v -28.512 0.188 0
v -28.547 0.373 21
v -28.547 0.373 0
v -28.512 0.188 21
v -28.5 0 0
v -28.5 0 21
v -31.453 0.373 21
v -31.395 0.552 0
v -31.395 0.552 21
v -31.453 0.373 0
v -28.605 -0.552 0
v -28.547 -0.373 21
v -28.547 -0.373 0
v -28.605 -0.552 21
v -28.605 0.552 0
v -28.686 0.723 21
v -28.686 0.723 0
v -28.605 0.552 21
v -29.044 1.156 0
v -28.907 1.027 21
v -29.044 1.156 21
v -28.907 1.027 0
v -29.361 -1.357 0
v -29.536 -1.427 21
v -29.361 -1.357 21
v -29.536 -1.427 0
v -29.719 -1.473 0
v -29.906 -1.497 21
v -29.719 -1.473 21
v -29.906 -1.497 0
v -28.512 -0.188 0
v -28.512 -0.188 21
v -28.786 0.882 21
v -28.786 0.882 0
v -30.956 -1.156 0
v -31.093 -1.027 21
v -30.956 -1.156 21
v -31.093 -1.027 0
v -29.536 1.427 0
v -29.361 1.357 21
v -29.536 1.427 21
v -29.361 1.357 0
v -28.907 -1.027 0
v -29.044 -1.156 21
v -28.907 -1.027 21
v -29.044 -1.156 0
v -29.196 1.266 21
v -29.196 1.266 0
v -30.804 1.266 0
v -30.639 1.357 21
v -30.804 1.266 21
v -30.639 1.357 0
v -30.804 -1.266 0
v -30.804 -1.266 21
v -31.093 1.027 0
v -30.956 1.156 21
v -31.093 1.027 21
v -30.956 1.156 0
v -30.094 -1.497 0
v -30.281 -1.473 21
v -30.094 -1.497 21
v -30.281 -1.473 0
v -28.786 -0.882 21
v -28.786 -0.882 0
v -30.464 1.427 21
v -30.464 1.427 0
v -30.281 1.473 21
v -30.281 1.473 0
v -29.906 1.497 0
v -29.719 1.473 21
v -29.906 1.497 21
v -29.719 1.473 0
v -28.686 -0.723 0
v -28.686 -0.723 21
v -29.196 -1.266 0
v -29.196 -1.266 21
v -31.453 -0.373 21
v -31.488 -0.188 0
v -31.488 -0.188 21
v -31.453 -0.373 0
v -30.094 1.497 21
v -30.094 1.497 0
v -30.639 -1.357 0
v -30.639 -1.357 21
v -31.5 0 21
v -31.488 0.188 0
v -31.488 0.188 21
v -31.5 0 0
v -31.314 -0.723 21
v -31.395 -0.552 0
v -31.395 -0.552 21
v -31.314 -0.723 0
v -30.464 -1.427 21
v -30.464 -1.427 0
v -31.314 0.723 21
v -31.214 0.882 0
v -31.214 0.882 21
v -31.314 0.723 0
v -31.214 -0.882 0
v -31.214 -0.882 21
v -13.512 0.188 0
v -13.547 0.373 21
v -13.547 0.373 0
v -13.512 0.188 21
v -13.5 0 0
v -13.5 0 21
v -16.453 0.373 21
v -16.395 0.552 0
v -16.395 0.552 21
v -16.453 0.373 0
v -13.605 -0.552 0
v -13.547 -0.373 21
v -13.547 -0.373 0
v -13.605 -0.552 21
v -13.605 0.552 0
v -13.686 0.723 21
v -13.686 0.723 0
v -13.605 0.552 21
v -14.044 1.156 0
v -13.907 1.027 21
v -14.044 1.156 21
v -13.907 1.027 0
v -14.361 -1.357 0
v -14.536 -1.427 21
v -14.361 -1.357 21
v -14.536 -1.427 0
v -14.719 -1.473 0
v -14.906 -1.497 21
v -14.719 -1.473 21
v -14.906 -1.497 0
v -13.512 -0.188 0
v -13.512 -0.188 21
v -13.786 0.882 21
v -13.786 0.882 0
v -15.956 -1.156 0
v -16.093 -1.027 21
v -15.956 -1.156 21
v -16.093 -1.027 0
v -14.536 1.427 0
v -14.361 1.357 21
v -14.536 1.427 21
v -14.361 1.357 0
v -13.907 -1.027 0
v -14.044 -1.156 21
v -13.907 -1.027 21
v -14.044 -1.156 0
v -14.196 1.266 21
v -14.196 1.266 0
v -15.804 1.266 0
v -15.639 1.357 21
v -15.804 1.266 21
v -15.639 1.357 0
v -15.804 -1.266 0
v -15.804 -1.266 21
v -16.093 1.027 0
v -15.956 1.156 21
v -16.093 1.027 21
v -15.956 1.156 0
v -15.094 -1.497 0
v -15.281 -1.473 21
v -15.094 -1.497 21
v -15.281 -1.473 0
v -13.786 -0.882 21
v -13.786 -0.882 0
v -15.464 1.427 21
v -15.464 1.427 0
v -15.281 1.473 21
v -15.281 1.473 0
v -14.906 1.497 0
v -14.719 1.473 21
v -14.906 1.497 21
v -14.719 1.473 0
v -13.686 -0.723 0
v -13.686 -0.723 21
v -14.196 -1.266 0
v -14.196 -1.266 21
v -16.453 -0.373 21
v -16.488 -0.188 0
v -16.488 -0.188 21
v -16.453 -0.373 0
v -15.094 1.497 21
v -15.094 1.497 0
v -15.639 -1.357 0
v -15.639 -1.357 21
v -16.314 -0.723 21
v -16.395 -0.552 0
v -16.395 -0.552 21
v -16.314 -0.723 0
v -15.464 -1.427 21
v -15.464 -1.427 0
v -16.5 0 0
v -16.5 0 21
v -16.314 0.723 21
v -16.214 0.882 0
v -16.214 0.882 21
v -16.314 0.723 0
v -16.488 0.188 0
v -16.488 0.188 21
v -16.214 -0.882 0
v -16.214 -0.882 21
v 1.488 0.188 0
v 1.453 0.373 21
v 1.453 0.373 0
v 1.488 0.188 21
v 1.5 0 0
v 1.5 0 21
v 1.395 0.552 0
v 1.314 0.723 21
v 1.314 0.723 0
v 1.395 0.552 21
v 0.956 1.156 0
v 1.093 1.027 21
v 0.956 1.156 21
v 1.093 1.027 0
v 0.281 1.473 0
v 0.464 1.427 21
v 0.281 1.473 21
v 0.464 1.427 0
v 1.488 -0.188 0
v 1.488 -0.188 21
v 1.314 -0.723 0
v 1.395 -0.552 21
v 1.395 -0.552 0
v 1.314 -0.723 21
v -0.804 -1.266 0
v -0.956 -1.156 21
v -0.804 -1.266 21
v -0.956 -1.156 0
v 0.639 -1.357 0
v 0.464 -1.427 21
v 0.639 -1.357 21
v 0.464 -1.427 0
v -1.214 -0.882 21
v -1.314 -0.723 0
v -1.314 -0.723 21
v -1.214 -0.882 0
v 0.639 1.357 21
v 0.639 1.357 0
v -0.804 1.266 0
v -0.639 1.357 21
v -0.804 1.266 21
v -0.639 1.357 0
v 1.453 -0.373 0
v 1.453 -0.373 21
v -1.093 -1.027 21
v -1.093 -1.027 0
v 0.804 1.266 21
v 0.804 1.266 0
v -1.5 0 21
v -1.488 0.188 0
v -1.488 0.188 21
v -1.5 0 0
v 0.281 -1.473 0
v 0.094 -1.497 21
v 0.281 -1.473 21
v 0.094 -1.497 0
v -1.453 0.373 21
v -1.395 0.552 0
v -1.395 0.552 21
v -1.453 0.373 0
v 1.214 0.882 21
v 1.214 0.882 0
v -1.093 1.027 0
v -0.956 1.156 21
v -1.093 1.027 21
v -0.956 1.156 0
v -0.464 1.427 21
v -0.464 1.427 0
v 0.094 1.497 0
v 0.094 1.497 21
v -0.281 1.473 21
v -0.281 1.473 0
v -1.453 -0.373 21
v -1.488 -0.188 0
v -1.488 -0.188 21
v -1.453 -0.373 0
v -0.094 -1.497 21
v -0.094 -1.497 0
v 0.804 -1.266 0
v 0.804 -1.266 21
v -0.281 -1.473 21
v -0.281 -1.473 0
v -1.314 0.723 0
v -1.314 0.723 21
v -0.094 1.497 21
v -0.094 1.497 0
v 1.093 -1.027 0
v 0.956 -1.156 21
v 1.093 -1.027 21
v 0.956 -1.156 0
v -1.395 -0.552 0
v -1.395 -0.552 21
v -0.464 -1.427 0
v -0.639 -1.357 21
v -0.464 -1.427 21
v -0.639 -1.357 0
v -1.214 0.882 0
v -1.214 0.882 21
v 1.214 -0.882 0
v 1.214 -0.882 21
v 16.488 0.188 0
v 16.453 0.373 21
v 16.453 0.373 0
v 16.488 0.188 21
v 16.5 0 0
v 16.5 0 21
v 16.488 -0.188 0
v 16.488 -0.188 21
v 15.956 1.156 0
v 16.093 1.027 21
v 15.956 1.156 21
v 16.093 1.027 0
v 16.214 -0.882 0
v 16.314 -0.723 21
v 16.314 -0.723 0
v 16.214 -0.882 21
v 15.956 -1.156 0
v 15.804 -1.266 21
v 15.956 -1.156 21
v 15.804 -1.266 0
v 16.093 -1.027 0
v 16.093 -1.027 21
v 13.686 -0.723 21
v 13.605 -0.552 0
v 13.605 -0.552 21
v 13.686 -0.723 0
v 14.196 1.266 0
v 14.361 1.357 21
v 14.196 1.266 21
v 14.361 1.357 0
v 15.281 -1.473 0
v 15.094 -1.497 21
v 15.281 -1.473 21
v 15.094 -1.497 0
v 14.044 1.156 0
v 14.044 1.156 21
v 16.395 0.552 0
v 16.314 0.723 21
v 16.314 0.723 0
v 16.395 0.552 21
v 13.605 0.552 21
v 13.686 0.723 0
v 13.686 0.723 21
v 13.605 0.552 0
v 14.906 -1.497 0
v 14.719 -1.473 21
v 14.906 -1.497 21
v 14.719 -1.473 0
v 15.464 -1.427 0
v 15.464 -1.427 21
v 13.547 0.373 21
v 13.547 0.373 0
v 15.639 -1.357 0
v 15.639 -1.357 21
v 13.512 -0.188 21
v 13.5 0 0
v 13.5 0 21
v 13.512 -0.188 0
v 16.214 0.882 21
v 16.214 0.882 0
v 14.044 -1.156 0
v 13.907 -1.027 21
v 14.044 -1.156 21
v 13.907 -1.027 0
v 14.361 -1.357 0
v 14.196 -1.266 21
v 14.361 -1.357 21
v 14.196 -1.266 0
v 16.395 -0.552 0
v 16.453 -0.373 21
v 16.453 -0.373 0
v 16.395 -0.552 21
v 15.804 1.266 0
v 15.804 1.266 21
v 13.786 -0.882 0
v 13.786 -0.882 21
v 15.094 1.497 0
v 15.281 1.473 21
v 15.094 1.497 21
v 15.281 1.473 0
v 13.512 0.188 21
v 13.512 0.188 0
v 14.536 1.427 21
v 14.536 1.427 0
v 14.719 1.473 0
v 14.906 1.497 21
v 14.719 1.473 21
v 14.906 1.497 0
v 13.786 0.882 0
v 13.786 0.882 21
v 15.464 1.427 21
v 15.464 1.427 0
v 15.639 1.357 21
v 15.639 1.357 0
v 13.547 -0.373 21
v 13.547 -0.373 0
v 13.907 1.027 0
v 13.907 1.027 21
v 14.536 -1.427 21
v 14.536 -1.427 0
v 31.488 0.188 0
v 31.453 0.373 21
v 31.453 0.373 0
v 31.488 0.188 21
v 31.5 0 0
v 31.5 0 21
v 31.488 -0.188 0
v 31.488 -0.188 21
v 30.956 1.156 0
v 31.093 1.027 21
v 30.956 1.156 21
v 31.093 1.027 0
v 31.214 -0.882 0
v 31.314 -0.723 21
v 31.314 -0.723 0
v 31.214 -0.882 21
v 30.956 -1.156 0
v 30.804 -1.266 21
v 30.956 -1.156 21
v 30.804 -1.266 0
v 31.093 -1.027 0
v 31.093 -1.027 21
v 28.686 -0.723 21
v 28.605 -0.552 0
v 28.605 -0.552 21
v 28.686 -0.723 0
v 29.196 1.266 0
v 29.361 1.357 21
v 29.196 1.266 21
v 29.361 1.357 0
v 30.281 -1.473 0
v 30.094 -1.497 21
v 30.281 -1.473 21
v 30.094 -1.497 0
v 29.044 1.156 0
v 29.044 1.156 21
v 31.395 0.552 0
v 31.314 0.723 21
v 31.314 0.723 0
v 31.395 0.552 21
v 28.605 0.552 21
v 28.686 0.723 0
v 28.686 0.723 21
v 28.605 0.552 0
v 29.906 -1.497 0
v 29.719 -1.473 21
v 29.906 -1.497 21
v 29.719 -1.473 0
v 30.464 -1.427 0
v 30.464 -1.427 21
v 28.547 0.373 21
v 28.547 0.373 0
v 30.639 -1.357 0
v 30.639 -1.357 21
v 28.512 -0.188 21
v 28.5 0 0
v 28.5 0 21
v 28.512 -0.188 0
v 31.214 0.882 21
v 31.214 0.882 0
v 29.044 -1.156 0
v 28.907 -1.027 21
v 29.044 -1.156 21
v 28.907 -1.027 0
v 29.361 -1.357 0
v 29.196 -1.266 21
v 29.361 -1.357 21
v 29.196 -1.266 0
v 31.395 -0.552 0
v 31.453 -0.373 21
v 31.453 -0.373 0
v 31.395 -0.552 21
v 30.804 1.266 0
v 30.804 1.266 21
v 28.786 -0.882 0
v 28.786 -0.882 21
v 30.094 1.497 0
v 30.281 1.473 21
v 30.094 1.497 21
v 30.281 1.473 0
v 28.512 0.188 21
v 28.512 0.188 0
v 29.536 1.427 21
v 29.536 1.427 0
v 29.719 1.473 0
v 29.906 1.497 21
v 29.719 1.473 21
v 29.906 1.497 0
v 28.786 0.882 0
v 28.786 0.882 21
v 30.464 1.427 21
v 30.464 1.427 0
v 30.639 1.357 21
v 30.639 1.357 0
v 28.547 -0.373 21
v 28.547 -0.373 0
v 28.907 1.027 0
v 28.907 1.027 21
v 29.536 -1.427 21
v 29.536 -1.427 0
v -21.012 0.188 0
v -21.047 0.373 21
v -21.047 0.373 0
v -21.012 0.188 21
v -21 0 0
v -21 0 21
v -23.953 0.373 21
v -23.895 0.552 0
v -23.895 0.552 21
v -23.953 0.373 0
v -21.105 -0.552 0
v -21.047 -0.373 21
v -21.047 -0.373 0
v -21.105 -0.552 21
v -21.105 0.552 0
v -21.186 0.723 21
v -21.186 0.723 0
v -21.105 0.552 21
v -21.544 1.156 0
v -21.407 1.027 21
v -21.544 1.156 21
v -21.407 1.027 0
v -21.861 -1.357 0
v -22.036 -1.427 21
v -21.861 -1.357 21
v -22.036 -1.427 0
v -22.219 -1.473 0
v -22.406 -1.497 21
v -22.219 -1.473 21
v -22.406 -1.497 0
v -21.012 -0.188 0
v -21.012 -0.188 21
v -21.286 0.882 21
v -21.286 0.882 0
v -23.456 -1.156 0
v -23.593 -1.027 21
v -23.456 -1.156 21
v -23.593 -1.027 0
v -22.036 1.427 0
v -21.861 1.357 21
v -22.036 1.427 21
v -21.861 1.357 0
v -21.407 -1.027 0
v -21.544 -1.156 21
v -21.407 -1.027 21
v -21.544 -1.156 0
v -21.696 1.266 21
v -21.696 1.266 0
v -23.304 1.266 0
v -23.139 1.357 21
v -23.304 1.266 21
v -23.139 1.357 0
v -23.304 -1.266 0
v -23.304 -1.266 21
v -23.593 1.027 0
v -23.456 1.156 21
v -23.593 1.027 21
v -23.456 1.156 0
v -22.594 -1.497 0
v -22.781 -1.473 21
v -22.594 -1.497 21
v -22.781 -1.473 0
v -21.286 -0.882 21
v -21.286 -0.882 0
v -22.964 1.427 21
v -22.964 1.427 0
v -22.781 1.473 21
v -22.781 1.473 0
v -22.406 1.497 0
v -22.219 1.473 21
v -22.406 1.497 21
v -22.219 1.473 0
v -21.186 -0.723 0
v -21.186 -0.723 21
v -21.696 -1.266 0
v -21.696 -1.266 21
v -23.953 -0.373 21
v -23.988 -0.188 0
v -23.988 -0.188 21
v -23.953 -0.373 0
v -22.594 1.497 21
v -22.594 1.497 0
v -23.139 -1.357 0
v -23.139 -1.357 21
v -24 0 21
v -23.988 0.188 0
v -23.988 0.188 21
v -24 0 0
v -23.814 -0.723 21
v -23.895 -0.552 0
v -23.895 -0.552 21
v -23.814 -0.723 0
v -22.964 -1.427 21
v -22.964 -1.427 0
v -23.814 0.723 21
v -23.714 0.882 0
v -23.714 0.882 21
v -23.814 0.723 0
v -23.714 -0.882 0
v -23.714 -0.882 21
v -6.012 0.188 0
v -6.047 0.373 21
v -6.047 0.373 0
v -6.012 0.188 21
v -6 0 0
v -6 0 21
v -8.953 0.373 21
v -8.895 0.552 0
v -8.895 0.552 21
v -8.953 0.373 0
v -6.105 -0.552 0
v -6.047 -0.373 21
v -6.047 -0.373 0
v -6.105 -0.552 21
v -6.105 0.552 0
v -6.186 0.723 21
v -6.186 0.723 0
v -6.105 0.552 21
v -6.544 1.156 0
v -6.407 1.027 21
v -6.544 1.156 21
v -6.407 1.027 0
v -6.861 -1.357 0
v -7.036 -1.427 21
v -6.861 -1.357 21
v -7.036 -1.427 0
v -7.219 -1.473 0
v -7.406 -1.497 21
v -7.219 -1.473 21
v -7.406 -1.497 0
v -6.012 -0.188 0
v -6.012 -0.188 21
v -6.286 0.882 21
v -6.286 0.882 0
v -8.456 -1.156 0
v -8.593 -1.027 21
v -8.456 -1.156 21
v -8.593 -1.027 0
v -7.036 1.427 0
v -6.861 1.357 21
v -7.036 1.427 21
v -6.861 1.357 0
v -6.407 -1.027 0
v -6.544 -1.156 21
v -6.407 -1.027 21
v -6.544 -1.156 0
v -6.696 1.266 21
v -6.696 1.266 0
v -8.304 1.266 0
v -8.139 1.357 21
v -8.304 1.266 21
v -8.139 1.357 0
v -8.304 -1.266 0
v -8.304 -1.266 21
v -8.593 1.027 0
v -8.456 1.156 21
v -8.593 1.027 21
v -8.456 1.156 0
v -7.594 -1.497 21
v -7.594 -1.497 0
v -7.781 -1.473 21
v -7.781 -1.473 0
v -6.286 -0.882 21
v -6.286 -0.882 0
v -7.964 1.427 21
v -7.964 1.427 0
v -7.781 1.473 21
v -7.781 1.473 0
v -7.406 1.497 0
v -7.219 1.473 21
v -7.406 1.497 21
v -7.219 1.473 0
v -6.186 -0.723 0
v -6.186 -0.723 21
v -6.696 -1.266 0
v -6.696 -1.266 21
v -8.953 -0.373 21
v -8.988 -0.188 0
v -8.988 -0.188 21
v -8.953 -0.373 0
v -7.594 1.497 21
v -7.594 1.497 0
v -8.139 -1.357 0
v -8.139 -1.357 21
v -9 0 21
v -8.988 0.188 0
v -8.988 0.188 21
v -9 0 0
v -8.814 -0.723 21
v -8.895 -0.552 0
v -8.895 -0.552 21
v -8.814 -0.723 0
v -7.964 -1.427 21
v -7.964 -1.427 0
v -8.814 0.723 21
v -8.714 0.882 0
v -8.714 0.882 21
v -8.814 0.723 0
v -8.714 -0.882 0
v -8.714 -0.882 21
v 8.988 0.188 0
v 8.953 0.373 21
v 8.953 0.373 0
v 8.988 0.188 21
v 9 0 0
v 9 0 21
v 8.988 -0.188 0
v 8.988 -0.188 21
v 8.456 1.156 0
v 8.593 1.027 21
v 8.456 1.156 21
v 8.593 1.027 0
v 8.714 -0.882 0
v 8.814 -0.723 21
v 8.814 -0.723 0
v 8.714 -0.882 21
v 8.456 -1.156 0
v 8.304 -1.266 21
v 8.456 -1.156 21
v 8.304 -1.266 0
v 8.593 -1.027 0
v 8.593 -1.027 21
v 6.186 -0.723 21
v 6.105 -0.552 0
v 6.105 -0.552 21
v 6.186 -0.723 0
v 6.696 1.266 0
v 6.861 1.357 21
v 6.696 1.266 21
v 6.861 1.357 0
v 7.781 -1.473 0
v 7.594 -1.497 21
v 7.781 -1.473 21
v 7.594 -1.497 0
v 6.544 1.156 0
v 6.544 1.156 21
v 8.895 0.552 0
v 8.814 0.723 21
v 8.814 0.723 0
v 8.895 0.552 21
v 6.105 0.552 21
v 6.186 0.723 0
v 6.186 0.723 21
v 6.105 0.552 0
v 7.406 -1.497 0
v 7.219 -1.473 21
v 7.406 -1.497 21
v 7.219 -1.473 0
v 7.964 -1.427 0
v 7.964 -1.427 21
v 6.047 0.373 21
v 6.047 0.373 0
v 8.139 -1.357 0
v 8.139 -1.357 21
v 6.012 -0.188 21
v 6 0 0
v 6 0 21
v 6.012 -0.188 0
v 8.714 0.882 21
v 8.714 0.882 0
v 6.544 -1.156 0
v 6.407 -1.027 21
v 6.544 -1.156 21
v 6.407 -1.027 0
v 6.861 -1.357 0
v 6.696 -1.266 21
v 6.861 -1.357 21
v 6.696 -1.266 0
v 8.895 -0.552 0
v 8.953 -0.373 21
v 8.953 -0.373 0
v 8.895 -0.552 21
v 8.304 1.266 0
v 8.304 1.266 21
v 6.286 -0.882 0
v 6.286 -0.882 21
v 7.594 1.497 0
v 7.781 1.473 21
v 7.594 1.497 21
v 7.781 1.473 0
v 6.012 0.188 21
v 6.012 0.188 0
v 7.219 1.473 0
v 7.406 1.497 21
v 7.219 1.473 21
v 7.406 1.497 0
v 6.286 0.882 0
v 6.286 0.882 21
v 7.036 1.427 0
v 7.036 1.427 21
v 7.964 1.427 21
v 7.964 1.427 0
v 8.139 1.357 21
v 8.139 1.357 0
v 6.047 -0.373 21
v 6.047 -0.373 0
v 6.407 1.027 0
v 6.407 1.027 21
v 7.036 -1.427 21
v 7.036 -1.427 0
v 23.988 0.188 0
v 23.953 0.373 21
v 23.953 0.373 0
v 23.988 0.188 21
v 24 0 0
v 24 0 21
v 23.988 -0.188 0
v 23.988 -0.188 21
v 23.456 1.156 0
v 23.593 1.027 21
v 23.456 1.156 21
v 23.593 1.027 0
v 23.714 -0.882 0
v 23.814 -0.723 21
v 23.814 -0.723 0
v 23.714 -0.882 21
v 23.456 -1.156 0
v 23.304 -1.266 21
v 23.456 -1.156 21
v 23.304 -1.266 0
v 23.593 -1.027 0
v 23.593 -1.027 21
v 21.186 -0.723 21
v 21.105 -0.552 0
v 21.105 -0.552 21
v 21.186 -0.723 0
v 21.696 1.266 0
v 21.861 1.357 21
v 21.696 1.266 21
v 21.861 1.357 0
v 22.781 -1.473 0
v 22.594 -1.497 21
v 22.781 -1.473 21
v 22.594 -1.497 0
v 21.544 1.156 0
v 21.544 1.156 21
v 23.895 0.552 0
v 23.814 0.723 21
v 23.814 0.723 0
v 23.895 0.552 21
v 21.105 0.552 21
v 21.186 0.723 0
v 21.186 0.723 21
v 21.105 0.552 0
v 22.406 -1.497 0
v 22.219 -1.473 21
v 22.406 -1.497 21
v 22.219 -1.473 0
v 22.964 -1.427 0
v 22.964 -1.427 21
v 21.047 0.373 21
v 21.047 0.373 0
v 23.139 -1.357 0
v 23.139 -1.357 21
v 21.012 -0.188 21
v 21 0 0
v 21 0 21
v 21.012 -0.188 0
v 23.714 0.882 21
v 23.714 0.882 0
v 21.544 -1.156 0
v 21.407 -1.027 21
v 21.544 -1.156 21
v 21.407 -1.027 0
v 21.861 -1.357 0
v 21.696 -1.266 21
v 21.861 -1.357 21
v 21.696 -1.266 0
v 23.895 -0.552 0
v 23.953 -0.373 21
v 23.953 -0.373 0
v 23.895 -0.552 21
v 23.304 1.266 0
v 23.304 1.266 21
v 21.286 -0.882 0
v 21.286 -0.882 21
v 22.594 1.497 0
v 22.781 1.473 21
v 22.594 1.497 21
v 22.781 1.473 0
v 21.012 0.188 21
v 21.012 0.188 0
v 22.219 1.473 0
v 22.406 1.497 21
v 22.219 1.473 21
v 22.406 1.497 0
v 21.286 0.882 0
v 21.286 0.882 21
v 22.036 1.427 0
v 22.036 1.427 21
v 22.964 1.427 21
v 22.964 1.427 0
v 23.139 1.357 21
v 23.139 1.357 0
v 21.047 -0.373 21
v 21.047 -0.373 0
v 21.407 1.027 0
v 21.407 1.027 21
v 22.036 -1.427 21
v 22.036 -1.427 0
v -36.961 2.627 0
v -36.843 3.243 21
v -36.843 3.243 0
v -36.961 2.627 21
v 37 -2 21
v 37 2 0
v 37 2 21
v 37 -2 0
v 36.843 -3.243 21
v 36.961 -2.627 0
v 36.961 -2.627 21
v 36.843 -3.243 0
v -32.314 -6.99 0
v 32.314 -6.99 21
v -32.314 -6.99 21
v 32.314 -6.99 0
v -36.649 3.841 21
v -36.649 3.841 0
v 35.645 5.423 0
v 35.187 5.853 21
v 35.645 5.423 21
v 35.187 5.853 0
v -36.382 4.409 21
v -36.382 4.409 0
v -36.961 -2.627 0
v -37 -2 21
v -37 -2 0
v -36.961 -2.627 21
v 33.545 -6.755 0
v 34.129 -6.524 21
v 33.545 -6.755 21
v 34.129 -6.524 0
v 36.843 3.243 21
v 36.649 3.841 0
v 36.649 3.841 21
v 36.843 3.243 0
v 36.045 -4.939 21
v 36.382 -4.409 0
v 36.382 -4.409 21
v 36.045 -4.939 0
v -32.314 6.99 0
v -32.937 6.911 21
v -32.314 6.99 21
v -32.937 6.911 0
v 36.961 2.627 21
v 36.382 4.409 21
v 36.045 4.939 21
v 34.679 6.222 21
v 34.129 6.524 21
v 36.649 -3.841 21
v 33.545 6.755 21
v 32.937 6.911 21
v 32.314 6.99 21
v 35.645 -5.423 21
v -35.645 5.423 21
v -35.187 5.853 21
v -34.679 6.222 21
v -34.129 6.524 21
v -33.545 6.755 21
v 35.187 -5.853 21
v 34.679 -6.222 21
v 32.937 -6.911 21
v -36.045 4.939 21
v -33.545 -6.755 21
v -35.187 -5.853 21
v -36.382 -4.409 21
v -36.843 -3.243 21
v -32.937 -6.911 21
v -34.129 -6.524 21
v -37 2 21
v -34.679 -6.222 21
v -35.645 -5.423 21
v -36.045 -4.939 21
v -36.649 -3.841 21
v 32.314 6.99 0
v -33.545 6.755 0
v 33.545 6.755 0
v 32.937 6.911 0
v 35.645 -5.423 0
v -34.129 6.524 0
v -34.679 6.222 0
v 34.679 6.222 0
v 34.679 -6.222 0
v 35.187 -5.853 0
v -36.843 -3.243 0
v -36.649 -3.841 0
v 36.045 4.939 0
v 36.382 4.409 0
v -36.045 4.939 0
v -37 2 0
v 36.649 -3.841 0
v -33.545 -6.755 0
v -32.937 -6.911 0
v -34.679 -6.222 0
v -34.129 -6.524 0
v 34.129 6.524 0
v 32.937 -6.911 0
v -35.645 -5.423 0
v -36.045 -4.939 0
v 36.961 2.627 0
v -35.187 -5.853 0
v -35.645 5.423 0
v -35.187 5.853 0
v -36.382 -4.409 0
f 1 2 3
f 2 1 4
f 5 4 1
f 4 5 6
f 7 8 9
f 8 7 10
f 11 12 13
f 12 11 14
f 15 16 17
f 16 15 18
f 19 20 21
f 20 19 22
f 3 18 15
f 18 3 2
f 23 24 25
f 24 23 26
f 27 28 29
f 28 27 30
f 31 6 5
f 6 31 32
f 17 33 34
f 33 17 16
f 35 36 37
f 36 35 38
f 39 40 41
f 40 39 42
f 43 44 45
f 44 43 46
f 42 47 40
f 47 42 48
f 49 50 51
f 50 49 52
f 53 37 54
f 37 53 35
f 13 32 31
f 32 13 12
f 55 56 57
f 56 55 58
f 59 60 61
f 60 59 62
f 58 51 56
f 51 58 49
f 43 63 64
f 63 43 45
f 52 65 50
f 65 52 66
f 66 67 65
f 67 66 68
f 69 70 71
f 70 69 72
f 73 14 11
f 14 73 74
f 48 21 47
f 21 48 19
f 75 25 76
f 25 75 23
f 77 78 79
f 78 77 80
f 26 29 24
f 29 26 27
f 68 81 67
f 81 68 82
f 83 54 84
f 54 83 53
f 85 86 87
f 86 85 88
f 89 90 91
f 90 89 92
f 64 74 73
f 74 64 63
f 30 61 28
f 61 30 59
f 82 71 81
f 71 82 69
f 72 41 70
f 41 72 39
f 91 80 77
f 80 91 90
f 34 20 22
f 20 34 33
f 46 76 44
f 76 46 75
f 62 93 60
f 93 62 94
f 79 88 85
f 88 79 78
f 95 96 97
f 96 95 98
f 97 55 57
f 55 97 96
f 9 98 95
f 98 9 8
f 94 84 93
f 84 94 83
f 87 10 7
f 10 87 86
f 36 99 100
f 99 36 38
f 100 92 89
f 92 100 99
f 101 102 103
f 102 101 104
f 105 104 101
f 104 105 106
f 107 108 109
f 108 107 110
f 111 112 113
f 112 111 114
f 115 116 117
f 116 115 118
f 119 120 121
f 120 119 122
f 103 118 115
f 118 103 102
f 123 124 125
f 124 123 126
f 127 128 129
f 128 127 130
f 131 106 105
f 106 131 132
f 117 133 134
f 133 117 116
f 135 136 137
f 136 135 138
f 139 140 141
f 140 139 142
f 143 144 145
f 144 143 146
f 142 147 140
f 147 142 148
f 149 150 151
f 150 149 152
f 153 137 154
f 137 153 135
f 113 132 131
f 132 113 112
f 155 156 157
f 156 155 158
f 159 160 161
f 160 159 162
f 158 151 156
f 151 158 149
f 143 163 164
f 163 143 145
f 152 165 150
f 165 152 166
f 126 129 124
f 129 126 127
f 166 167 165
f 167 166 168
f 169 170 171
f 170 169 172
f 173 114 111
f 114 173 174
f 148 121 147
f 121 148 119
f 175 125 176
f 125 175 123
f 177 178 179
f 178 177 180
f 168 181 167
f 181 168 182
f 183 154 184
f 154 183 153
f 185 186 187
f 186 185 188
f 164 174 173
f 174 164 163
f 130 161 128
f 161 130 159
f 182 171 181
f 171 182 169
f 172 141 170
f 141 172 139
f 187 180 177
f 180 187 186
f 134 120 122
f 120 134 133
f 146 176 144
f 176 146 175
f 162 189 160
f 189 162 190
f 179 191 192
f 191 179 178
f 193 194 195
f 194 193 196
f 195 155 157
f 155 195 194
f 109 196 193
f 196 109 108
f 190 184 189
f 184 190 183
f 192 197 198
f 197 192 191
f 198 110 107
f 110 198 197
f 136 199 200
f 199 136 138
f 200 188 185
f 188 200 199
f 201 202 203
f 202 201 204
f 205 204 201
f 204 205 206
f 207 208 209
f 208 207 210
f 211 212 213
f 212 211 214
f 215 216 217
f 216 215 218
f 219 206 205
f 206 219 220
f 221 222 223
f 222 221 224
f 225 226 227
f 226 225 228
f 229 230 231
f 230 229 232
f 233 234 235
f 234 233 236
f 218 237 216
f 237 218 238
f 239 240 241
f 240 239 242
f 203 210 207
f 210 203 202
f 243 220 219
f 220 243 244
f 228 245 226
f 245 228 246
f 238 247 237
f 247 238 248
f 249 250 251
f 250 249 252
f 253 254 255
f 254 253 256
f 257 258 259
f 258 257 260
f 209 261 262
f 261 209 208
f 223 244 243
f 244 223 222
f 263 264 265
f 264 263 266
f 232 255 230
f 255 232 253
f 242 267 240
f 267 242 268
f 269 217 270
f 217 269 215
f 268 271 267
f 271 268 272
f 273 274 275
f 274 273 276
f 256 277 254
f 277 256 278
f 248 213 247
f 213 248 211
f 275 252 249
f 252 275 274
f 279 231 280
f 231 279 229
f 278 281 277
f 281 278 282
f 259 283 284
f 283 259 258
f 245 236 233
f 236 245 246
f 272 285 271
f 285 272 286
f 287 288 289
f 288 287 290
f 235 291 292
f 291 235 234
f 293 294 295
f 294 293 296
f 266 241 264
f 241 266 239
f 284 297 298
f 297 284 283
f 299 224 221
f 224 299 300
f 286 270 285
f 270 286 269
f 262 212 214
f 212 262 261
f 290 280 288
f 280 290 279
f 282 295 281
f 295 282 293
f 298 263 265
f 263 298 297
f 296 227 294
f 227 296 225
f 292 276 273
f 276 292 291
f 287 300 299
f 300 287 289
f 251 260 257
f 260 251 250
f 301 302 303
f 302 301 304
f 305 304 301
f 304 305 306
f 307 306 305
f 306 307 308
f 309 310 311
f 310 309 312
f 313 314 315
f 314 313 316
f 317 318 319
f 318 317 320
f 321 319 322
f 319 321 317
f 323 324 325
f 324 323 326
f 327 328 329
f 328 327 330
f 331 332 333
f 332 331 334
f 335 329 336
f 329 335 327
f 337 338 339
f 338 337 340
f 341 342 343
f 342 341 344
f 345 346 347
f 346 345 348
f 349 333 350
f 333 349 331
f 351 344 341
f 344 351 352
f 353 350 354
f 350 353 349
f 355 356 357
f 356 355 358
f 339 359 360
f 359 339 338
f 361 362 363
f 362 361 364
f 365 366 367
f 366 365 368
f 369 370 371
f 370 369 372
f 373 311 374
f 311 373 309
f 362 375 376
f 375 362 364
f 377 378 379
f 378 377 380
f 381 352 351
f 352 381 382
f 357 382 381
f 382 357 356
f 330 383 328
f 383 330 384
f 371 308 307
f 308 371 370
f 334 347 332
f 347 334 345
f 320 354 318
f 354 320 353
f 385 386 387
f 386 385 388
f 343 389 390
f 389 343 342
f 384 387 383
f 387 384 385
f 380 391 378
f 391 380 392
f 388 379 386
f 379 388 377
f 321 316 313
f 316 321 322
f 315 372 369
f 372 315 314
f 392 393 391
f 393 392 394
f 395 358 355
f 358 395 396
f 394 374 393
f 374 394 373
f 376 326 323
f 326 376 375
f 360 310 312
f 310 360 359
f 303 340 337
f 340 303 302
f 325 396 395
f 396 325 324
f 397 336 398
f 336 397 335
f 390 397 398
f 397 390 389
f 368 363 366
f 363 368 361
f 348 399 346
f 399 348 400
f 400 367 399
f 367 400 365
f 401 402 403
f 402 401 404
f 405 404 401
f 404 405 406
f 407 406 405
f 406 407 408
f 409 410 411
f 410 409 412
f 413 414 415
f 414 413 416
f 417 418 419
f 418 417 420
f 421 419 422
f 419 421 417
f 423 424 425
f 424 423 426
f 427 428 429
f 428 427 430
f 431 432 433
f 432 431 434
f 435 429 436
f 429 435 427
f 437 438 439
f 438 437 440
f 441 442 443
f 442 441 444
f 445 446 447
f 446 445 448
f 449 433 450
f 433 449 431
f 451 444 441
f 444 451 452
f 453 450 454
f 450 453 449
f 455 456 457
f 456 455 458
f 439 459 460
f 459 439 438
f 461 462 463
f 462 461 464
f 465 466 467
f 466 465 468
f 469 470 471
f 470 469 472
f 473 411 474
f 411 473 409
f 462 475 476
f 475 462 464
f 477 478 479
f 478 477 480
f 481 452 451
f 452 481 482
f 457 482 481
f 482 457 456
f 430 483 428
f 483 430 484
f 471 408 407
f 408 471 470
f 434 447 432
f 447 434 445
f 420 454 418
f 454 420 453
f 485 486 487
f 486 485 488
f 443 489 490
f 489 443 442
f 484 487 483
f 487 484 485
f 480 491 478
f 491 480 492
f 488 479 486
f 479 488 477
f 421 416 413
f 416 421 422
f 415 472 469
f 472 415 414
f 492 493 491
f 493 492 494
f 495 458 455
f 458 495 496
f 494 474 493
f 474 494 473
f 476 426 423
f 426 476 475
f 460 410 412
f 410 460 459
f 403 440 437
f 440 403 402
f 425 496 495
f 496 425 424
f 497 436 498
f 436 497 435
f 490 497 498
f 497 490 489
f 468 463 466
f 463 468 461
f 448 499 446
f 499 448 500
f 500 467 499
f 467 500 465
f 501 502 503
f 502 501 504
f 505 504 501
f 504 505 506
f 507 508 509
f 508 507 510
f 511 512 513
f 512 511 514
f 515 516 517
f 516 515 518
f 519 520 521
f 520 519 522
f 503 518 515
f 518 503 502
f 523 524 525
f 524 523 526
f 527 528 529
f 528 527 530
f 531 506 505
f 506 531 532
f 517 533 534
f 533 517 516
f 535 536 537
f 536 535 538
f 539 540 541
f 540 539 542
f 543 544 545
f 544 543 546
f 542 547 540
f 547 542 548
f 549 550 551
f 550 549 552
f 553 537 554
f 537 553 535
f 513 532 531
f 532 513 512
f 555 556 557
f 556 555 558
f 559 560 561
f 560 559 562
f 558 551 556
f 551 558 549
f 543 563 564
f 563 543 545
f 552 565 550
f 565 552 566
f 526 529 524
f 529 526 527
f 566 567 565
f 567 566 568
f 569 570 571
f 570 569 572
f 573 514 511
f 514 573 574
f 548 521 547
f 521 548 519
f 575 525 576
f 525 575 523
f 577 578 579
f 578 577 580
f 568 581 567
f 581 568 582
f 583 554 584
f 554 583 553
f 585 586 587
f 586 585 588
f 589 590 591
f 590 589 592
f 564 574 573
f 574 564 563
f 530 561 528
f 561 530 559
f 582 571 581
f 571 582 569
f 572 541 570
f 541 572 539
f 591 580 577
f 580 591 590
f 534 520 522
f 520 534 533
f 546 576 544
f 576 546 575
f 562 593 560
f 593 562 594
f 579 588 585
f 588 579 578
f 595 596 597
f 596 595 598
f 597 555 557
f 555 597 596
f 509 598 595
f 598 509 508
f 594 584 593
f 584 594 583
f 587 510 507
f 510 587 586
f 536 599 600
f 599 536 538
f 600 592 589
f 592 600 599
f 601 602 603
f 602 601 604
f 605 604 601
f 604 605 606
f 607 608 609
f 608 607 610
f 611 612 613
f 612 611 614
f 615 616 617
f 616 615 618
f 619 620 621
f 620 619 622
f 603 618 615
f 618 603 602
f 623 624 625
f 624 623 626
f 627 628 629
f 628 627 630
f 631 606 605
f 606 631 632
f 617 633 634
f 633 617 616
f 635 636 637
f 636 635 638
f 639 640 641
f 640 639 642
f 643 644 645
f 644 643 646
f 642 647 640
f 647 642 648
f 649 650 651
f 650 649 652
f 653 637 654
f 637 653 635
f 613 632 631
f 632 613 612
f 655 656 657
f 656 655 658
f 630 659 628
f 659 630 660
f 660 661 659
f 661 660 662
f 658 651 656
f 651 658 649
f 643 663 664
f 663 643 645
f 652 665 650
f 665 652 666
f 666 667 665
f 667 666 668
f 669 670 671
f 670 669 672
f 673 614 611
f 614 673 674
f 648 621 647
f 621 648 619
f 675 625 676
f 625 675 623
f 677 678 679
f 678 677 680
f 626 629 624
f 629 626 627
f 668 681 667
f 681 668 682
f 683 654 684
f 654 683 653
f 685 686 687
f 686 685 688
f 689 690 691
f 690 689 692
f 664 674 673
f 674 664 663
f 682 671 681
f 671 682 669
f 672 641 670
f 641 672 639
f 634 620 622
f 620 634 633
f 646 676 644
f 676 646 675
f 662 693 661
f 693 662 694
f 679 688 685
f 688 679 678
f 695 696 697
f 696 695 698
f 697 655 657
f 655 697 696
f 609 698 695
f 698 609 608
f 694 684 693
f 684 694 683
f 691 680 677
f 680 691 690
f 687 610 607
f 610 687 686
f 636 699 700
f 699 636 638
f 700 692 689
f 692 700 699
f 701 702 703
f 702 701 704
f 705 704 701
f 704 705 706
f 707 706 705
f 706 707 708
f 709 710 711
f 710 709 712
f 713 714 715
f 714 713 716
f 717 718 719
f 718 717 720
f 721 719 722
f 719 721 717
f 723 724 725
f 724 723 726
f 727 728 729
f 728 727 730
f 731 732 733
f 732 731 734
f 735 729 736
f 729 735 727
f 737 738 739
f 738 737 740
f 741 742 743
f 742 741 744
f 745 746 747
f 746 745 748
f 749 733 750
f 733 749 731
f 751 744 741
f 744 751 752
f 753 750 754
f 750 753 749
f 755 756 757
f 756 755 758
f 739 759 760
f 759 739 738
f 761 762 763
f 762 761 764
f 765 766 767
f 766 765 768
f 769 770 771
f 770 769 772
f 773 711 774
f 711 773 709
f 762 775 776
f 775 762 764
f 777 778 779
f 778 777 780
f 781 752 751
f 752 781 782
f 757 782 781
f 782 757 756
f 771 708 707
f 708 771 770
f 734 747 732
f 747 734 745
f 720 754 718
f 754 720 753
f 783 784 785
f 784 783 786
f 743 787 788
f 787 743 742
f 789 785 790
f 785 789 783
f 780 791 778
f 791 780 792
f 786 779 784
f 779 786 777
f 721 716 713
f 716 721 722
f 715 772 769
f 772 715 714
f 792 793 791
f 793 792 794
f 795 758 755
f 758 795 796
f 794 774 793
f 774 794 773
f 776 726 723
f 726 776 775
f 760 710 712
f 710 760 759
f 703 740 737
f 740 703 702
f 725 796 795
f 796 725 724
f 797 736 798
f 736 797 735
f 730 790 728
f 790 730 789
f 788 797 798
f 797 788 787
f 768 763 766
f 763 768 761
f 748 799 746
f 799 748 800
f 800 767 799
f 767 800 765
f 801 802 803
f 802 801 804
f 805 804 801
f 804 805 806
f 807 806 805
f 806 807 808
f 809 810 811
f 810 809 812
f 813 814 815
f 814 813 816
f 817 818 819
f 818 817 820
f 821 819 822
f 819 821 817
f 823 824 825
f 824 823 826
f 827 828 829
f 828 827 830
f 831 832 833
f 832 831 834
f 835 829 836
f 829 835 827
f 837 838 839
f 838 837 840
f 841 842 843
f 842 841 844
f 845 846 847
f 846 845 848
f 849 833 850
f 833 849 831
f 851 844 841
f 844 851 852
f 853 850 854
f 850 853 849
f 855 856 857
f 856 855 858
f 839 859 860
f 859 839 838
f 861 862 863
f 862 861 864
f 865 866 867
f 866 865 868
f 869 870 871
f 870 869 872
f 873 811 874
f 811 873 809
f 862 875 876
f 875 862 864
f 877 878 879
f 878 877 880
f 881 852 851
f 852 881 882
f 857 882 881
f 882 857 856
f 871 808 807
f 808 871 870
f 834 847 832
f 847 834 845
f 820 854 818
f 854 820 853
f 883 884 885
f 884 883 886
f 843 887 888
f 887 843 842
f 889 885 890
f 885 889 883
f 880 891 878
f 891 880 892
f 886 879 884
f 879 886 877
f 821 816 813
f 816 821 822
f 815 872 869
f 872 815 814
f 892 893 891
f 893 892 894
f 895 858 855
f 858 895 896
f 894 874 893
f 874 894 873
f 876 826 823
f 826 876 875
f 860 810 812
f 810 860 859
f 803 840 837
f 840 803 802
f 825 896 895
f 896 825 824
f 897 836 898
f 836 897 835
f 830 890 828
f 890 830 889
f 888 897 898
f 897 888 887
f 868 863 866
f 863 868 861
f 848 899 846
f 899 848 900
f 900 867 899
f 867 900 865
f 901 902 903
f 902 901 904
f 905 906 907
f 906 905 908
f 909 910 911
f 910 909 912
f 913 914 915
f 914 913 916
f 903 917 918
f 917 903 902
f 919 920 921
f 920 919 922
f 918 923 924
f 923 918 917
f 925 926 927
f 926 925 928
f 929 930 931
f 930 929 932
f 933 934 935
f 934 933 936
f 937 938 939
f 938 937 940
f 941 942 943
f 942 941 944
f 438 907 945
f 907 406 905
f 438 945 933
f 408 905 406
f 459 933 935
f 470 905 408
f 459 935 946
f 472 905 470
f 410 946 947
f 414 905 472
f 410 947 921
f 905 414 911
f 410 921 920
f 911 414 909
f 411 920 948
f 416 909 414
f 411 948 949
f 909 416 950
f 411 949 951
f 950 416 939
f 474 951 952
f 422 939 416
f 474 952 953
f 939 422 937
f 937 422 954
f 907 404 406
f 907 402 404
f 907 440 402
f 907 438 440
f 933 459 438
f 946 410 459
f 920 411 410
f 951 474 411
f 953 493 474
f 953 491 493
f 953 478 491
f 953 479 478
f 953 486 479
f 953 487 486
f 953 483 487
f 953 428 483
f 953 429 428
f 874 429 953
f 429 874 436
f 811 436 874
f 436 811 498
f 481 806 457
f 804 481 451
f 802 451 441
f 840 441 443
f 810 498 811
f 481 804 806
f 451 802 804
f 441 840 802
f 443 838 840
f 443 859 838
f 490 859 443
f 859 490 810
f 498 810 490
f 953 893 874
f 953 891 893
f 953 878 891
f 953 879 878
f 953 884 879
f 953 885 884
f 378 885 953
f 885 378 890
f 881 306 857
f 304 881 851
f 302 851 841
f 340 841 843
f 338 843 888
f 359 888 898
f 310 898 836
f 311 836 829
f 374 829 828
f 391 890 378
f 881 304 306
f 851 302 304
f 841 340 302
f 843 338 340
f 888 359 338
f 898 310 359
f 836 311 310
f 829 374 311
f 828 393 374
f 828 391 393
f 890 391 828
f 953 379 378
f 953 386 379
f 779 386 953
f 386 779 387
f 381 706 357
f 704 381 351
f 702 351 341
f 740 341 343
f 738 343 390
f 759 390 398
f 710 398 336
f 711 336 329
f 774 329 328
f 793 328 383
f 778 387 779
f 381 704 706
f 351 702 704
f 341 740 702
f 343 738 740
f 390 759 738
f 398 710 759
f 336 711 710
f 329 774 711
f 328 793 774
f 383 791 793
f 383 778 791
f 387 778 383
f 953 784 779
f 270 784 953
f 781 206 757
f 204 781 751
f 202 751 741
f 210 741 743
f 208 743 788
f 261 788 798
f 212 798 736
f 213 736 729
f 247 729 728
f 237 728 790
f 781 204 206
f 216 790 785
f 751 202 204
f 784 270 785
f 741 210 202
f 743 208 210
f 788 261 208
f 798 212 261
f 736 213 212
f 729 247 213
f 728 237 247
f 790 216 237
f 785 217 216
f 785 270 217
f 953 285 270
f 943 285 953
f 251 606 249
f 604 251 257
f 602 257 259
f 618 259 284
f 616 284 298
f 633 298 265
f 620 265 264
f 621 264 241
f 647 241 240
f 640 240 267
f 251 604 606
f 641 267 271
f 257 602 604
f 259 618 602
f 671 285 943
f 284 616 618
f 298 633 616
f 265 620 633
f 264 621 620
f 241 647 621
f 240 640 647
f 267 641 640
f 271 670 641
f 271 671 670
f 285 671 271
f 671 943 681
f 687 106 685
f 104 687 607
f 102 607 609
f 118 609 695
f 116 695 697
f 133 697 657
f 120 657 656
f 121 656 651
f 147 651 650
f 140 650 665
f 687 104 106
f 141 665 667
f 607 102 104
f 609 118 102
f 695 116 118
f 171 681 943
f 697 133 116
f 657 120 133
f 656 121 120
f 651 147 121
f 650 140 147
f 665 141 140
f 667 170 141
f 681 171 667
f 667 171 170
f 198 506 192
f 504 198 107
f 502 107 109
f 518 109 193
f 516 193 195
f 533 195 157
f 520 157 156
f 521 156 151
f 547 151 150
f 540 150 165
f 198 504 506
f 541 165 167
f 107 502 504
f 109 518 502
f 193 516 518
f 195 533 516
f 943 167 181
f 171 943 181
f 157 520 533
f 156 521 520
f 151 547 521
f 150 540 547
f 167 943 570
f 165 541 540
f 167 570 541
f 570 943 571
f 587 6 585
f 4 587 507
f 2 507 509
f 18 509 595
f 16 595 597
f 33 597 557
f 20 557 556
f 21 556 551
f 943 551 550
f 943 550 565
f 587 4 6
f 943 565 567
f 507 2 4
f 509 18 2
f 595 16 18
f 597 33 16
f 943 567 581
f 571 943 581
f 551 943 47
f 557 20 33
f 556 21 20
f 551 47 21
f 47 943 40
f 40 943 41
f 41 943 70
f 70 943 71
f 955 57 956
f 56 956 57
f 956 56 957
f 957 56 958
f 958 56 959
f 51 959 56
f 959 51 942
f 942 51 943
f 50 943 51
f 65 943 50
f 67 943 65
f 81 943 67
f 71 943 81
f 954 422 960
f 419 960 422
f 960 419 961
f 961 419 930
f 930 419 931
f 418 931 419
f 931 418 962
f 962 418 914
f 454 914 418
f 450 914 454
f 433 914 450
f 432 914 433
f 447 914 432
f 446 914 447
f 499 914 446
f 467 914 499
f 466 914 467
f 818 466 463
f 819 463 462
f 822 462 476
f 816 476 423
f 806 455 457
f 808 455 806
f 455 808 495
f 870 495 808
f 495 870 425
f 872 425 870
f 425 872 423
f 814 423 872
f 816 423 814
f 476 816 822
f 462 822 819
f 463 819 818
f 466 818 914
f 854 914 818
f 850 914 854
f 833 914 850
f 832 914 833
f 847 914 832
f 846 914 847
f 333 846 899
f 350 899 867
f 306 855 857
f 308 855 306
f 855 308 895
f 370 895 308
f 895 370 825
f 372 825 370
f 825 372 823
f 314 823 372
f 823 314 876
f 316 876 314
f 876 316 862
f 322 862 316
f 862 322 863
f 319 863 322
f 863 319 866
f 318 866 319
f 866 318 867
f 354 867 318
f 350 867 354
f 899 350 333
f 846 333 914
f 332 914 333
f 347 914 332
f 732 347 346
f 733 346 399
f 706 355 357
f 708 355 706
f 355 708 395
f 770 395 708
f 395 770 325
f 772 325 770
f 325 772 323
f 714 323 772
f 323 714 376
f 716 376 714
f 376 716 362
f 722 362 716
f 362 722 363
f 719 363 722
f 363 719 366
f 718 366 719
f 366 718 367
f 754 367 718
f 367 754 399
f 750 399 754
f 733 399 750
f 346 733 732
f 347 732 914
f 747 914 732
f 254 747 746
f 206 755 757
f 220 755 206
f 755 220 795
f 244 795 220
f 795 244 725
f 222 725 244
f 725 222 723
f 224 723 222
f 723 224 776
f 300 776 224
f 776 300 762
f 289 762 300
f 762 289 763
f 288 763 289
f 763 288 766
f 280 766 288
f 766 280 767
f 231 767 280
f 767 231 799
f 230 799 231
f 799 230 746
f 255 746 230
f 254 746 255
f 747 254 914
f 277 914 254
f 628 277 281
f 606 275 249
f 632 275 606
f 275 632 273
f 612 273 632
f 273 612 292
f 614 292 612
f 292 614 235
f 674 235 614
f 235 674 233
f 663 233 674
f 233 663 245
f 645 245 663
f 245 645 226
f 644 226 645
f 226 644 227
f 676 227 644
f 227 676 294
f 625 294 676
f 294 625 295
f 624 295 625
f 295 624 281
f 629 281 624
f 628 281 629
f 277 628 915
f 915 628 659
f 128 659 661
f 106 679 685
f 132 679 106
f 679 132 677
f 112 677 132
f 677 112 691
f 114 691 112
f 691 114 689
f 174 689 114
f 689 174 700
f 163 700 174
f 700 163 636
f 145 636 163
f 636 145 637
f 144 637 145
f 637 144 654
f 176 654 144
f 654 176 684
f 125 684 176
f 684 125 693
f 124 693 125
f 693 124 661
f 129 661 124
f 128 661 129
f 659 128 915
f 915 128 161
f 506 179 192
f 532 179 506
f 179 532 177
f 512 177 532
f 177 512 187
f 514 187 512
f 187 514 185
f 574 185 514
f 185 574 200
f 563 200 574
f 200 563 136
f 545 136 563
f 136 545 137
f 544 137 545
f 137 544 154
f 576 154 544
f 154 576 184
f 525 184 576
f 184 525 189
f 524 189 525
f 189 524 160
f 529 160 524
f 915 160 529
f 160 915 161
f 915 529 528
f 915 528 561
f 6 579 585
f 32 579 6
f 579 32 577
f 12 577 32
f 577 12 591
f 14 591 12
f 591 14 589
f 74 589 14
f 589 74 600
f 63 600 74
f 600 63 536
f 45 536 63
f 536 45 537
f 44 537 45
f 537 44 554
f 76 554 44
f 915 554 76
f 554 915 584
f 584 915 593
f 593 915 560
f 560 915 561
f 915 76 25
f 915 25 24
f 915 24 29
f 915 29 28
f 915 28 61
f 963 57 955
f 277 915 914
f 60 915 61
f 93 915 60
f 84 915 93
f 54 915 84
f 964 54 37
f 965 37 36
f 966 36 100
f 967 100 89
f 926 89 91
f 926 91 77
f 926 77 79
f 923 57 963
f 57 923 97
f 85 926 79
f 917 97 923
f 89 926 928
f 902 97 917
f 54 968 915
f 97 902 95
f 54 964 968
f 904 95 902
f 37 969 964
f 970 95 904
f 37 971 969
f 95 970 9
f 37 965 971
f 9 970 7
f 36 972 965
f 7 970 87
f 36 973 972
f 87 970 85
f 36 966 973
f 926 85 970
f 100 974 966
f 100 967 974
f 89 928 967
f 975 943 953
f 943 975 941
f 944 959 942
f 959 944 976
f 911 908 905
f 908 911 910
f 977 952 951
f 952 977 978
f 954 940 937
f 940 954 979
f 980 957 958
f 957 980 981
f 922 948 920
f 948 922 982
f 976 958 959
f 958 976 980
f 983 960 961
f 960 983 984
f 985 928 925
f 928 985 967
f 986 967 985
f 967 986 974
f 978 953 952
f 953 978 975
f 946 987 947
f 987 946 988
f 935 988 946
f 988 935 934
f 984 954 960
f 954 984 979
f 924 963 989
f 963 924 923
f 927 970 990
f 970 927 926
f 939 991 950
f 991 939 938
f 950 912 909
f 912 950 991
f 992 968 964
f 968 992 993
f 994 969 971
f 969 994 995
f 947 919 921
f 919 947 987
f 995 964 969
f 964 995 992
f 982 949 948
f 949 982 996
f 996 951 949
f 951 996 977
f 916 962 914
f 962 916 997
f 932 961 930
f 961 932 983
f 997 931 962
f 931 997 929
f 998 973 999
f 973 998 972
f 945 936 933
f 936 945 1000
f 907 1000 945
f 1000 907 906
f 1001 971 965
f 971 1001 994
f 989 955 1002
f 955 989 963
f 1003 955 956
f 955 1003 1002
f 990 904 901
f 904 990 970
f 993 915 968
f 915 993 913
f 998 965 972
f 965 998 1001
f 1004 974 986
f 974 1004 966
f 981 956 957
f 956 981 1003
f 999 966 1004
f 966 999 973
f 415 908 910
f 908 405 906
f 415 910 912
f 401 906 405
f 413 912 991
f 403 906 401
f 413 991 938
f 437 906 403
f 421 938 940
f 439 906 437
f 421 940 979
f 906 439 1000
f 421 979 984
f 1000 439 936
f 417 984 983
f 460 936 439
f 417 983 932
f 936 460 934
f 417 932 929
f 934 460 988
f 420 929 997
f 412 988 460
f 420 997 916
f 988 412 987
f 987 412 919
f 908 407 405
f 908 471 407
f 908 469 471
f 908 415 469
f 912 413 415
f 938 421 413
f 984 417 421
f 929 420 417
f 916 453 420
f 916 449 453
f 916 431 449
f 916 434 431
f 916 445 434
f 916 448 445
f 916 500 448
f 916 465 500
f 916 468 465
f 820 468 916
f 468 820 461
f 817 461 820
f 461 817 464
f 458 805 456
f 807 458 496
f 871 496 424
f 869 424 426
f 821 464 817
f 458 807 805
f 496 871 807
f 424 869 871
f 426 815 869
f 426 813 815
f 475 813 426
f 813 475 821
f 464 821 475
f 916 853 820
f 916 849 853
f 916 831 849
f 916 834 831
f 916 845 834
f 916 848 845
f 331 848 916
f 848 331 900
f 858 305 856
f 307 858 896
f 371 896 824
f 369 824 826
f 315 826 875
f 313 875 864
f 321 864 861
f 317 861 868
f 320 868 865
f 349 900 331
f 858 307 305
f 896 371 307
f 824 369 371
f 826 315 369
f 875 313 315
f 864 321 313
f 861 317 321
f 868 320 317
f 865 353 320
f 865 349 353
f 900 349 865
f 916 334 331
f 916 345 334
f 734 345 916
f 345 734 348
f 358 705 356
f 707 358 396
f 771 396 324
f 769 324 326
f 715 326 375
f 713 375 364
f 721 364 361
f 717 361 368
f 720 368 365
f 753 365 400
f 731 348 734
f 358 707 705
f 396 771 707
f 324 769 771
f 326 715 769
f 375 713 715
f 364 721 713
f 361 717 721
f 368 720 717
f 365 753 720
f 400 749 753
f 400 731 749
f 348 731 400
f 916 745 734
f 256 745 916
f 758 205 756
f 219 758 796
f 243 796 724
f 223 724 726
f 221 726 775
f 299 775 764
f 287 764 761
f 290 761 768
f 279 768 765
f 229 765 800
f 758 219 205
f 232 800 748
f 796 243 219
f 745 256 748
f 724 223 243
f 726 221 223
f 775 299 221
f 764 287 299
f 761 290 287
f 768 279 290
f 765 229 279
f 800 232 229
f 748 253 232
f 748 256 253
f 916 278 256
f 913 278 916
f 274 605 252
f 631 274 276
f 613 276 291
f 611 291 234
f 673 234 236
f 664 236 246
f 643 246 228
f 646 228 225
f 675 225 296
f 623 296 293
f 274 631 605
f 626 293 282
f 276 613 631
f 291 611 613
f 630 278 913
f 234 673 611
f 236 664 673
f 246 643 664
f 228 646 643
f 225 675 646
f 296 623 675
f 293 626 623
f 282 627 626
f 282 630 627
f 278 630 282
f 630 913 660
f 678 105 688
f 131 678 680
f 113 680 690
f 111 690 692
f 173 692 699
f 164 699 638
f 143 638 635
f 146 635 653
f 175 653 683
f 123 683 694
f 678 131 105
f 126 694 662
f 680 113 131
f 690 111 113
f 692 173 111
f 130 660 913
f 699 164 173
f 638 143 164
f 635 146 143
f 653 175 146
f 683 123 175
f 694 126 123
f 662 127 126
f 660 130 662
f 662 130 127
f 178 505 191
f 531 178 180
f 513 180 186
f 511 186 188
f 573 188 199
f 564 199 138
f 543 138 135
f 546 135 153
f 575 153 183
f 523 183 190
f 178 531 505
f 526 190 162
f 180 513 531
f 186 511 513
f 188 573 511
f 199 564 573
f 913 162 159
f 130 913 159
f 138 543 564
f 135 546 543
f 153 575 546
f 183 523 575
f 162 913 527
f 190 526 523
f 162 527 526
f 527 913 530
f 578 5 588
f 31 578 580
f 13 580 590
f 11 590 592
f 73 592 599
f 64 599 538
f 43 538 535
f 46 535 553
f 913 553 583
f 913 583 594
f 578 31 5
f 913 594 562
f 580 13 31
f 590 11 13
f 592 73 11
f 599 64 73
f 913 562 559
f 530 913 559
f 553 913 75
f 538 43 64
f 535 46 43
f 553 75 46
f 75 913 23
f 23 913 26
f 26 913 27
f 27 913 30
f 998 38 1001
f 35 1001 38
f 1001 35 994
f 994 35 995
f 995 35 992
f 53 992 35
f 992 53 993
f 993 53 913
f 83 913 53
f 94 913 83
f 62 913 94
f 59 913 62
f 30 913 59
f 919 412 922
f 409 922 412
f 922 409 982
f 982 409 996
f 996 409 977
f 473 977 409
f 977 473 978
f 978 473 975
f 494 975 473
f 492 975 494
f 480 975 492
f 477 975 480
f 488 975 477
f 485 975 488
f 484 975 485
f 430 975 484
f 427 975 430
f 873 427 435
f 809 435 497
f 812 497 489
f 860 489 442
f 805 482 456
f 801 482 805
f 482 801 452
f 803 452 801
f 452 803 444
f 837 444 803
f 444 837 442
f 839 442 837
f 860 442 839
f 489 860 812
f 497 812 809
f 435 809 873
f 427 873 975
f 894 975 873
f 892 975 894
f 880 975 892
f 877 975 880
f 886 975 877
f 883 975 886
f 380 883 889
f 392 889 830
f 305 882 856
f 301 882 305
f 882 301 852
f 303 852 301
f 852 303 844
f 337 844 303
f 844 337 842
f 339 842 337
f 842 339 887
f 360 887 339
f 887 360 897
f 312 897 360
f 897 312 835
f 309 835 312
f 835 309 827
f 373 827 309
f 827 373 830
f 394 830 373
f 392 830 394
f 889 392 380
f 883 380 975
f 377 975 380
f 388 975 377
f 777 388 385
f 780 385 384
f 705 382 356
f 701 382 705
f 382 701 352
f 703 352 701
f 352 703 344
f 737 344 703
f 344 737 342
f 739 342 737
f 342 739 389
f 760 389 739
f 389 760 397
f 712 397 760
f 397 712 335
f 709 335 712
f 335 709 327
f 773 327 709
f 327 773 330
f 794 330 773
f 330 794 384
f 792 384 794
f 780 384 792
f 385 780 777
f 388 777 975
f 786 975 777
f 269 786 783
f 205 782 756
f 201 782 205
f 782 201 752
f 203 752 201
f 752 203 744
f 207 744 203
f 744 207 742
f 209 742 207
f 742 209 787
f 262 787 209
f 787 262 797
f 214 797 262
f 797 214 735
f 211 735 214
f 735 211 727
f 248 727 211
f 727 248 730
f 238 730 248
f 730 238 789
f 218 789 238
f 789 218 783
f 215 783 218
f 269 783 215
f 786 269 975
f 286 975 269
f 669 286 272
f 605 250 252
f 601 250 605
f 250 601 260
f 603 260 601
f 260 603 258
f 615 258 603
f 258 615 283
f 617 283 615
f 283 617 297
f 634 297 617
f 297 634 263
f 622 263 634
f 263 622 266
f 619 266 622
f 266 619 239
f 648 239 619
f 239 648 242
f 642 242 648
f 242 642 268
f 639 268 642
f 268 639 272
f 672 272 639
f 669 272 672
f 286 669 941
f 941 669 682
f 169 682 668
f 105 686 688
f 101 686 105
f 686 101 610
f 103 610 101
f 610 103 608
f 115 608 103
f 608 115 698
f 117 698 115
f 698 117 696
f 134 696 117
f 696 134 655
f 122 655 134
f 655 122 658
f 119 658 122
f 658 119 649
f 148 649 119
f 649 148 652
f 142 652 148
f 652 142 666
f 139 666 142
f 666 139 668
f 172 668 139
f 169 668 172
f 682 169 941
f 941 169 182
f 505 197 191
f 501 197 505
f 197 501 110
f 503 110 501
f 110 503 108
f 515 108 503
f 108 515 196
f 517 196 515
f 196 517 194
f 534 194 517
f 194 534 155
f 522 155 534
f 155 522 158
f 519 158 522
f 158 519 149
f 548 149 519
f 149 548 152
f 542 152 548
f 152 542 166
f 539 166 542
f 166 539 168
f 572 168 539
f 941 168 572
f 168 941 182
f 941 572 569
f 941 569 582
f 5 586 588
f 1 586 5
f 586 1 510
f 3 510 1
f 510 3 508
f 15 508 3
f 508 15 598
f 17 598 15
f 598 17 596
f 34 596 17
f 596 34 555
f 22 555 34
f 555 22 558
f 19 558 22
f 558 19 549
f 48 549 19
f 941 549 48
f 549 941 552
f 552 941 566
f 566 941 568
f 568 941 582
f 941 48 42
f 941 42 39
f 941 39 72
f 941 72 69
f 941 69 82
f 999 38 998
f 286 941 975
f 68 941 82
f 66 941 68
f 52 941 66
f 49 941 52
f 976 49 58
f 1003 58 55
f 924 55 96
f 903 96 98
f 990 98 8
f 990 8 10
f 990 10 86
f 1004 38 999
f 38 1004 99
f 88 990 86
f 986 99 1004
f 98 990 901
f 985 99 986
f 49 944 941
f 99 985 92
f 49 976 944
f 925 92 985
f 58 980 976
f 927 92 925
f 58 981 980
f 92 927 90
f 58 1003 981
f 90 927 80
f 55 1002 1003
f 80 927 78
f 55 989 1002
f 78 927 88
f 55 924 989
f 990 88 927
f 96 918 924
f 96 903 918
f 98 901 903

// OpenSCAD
$fn = 50;


difference() {
	union() {
		hull() {
			translate(v = [-32.0000000000, 2.0000000000, 0]) {
				cylinder(h = 21, r = 5);
			}
			translate(v = [32.0000000000, 2.0000000000, 0]) {
				cylinder(h = 21, r = 5);
			}
			translate(v = [-32.0000000000, -2.0000000000, 0]) {
				cylinder(h = 21, r = 5);
			}
			translate(v = [32.0000000000, -2.0000000000, 0]) {
				cylinder(h = 21, r = 5);
			}
		}
	}
	union() {
		translate(v = [-30.0000000000, 0.0000000000, 0]) {
			translate(v = [0, 0, -100]) {
				cylinder(h = 200, r = 1.5000000000);
			}
		}
		translate(v = [-15.0000000000, 0.0000000000, 0]) {
			translate(v = [0, 0, -100]) {
				cylinder(h = 200, r = 1.5000000000);
			}
		}
		translate(v = [0, 0, -100]) {
			cylinder(h = 200, r = 1.5000000000);
		}
		translate(v = [15.0000000000, 0.0000000000, 0]) {
			translate(v = [0, 0, -100]) {
				cylinder(h = 200, r = 1.5000000000);
			}
		}
		translate(v = [30.0000000000, 0.0000000000, 0]) {
			translate(v = [0, 0, -100]) {
				cylinder(h = 200, r = 1.5000000000);
			}
		}
		translate(v = [-30.0000000000, 0.0000000000, 0]) {
			translate(v = [0, 0, -100]) {
				cylinder(h = 200, r = 1.5000000000);
			}
		}
		translate(v = [-22.5000000000, 0.0000000000, 0]) {
			translate(v = [0, 0, -100]) {
				cylinder(h = 200, r = 1.5000000000);
			}
		}
		translate(v = [-15.0000000000, 0.0000000000, 0]) {
			translate(v = [0, 0, -100]) {
				cylinder(h = 200, r = 1.5000000000);
			}
		}
		translate(v = [-7.5000000000, 0.0000000000, 0]) {
			translate(v = [0, 0, -100]) {
				cylinder(h = 200, r = 1.5000000000);
			}
		}
		translate(v = [0, 0, -100]) {
			cylinder(h = 200, r = 1.5000000000);
		}
		translate(v = [7.5000000000, 0.0000000000, 0]) {
			translate(v = [0, 0, -100]) {
				cylinder(h = 200, r = 1.5000000000);
			}
		}
		translate(v = [15.0000000000, 0.0000000000, 0]) {
			translate(v = [0, 0, -100]) {
				cylinder(h = 200, r = 1.5000000000);
			}
		}
		translate(v = [22.5000000000, 0.0000000000, 0]) {
			translate(v = [0, 0, -100]) {
				cylinder(h = 200, r = 1.5000000000);
			}
		}
		translate(v = [30.0000000000, 0.0000000000, 0]) {
			translate(v = [0, 0, -100]) {
				cylinder(h = 200, r = 1.5000000000);
			}
		}
	}
}
